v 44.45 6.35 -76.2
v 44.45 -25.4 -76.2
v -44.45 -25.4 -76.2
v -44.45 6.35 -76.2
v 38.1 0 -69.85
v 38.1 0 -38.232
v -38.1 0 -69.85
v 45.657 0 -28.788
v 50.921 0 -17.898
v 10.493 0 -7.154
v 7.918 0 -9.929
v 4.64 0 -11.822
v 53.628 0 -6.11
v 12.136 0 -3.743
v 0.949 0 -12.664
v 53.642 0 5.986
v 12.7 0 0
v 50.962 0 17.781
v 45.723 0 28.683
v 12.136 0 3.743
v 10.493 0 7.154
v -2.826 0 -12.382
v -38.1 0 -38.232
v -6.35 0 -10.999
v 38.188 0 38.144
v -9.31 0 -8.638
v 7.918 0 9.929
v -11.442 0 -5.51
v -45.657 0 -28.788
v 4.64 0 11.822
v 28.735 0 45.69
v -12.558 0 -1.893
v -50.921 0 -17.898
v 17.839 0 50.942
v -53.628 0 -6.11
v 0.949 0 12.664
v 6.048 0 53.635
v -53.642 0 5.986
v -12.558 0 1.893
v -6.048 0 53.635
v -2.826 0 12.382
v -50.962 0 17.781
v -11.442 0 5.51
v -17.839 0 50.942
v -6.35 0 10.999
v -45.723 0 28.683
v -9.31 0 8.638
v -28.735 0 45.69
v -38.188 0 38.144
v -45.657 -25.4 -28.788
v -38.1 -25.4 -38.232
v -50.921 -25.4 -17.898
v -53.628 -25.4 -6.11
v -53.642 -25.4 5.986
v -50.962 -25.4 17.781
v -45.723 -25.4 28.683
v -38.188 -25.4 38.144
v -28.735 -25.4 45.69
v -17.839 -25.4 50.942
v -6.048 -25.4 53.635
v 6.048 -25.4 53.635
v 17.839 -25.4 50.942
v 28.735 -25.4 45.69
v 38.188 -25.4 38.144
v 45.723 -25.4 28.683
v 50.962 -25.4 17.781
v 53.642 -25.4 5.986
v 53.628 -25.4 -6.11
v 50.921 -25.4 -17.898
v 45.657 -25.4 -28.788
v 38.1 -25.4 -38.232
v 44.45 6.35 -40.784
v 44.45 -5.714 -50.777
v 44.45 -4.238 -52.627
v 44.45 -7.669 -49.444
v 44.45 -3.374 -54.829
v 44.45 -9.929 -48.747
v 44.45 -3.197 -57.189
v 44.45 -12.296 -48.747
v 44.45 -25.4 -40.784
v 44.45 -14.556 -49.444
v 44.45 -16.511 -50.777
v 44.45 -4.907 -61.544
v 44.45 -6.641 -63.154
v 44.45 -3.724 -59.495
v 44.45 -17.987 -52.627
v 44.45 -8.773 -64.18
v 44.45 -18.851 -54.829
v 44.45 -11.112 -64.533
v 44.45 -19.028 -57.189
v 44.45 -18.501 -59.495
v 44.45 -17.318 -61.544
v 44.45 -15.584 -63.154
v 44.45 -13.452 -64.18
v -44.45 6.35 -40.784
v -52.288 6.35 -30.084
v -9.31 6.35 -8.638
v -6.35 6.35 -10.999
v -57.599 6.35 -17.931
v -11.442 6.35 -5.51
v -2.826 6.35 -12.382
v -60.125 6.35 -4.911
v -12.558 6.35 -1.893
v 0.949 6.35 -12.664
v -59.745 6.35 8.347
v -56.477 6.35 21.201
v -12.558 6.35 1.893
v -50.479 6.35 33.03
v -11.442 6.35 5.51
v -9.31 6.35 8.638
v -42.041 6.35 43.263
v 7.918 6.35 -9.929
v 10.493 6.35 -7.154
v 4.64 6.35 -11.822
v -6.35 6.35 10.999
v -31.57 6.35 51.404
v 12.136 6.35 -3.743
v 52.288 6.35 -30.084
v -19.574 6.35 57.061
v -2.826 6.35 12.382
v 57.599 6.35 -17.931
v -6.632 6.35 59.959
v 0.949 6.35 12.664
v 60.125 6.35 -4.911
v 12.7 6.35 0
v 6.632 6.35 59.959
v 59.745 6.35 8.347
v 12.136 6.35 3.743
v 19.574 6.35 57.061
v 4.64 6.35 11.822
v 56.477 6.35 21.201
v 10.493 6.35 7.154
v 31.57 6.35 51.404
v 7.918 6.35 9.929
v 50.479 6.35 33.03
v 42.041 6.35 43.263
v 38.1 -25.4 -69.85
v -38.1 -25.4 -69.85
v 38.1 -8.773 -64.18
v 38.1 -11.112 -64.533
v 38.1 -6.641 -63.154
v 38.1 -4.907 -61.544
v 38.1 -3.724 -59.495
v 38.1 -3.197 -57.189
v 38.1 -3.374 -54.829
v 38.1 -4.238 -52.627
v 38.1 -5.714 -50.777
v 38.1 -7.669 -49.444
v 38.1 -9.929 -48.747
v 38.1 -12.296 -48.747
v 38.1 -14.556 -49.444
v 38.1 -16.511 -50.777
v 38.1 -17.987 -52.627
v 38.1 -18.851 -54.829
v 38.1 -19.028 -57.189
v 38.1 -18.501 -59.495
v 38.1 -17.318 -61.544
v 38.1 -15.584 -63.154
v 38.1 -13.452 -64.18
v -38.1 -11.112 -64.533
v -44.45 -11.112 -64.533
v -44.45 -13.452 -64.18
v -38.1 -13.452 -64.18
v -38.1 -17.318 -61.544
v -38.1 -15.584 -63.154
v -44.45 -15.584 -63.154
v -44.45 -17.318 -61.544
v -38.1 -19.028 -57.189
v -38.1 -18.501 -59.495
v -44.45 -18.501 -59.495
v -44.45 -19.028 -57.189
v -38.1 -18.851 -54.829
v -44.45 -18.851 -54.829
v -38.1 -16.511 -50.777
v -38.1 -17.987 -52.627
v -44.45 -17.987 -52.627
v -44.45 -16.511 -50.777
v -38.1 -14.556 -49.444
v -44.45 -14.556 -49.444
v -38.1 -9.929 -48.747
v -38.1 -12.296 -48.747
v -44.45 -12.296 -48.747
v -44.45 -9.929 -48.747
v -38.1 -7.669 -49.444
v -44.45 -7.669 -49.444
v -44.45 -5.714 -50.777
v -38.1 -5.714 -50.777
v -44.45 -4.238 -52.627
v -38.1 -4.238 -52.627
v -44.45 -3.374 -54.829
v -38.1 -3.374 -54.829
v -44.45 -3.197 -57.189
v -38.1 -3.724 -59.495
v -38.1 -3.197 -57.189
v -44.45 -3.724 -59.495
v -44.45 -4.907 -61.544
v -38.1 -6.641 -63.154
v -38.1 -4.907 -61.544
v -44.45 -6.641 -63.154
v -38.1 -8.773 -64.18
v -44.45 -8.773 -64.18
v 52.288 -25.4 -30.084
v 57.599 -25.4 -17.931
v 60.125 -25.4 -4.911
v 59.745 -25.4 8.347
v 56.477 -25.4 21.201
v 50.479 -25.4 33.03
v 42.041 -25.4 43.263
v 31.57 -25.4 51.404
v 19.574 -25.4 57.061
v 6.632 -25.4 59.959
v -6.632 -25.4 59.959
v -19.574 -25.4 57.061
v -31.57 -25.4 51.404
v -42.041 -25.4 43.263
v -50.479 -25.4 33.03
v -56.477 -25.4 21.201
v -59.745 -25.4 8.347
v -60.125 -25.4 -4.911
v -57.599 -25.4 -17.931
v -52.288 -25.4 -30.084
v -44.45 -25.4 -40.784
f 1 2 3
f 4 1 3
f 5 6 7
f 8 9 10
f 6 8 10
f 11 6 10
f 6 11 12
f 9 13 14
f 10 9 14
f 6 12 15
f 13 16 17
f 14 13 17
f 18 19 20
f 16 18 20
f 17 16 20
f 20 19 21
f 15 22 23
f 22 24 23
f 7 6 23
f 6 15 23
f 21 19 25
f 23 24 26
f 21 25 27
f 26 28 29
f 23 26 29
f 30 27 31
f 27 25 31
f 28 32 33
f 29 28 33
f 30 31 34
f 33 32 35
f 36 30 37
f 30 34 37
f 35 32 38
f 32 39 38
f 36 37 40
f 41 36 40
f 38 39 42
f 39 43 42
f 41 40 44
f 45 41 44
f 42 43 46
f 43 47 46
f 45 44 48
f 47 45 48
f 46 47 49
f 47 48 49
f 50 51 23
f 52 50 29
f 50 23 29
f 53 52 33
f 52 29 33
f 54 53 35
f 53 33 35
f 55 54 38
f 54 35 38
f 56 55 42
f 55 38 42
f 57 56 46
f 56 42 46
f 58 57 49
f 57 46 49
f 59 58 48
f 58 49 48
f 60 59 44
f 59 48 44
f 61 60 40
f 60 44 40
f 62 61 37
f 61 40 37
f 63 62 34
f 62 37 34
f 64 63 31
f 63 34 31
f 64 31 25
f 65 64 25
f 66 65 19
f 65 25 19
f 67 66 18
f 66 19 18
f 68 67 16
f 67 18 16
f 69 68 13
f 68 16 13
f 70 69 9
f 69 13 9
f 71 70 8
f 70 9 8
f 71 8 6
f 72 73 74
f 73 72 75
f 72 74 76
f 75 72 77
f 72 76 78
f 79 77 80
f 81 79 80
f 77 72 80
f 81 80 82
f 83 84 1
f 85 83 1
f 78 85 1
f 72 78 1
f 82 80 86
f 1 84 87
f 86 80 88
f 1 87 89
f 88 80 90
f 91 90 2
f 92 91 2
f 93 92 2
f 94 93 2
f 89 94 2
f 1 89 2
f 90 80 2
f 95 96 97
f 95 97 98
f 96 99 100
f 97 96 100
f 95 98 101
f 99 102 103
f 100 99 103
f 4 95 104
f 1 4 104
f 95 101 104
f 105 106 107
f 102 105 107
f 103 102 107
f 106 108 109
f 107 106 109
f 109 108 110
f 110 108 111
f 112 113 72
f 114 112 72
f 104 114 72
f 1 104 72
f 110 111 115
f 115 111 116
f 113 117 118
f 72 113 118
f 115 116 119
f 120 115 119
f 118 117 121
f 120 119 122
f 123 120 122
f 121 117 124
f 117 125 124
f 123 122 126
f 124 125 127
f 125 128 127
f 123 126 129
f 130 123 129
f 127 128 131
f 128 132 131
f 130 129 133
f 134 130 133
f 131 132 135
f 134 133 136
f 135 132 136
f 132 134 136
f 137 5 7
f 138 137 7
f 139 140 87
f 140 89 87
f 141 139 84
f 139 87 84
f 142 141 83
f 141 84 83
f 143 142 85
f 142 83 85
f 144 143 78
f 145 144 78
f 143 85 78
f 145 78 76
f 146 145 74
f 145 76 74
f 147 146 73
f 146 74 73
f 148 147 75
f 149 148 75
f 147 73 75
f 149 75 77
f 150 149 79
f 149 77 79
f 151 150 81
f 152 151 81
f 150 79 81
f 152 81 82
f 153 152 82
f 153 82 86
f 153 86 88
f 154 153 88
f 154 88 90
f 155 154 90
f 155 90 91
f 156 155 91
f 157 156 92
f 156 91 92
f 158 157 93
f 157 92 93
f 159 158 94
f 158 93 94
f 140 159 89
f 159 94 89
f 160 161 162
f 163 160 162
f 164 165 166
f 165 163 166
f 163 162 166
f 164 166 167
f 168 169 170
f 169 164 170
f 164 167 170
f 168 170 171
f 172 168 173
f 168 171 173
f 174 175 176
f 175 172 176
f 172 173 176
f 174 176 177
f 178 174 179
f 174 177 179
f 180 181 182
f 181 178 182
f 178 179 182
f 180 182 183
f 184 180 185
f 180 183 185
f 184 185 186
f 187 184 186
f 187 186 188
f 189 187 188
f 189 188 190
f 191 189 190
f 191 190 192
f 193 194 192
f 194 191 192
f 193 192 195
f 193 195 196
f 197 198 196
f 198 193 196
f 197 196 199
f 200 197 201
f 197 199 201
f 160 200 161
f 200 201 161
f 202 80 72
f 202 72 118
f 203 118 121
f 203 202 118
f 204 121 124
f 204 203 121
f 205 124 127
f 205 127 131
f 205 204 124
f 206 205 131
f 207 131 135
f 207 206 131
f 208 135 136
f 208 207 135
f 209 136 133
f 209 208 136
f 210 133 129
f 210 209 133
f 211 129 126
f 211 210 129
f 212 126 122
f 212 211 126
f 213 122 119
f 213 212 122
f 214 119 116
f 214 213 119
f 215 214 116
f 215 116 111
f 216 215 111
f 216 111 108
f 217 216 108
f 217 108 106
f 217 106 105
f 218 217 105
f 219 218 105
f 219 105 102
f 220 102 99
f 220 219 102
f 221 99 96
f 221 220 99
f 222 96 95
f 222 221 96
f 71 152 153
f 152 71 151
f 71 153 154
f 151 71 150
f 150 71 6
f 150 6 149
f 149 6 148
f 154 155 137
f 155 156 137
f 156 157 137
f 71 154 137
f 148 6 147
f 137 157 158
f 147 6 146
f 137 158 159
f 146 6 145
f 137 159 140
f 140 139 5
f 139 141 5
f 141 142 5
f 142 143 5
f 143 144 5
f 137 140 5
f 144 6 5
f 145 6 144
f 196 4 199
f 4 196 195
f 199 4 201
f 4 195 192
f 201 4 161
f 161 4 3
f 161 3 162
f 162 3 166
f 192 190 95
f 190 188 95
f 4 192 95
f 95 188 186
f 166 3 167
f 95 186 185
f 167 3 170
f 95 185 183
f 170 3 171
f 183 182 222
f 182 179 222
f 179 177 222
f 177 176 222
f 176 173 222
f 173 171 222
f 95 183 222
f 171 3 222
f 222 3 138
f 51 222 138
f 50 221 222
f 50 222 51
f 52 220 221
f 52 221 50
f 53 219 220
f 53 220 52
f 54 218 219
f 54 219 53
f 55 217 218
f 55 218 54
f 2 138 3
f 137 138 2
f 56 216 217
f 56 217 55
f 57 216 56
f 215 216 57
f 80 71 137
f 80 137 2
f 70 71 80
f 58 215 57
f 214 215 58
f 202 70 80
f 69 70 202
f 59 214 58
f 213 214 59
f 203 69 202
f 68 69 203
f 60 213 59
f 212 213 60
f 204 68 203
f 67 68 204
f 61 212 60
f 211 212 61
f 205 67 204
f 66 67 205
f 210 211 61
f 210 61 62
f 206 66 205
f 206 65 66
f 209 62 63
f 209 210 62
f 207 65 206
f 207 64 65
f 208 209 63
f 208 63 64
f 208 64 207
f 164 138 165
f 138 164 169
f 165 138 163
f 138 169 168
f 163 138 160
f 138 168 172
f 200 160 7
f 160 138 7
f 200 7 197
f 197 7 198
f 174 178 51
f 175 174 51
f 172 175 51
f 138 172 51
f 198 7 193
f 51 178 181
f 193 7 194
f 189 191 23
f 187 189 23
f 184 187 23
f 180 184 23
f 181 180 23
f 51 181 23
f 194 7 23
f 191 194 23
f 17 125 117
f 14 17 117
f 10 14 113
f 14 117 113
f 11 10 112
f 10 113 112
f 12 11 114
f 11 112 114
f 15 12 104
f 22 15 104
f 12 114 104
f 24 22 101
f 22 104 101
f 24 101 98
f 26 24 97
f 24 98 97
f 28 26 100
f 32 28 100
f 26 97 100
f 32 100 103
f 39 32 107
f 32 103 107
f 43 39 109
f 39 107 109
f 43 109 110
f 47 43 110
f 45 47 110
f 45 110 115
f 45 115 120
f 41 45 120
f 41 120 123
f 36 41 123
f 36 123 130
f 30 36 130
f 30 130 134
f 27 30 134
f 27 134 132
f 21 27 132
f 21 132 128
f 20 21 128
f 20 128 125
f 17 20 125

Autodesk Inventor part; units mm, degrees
ref_plane "YZ Plane" through (0, 0, 0) normal (1, 0, 0) x (0, 1, 0)
ref_plane "XZ Plane" through (0, 0, 0) normal (0, 1, 0) x (-1, 0, 0)
ref_plane "XY Plane" through (0, 0, 0) normal (0, 0, 1) x (1, 0, 0)
sketch "Sketch1" plane through (0, 0, 0) normal (0, 1, 0) x (-1, 0, 0)
  arc A0 (38.1, -38.2321) -> (-38.1, -38.2321) centre (0, 0) ccw
  line L0 (0, 0) -> (0, -72.7817) construction
  line L1 (-38.1, -38.2321) -> (-38.1, -69.85)
  line L2 (-38.1, -69.85) -> (0, -69.85)
  line L3 (0, -69.85) -> (38.1, -69.85)
  line L4 (38.1, -69.85) -> (38.1, -38.2321)
  dimension "d0" = 107.95
  dimension "d6" = 69.85
  dimension "d7" = 38.1
extrude "Extrusion1" add sketch "Sketch1" along normal blind 6.35
sketch "Sketch3" plane through (0, 0, 0) normal (0, -1, 0) x (1, 0, 0)
  arc A0 (38.1, -38.2321) -> (-38.1, -38.2321) centre (0, 0) ccw projected
  line L0 (38.1, -38.2321) -> (38.1, -69.85) projected
  line L1 (38.1, -69.85) -> (-38.1, -69.85) projected
  line L2 (-38.1, -69.85) -> (-38.1, -38.2321) projected
  arc A1 (38.1, -38.2321) -> (-38.1, -38.2321) centre (0, 0) ccw
  line L3 (38.1, -38.2321) -> (38.1, -69.85) projected
  line L4 (38.1, -38.2321) -> (38.1, -69.85)
  line L5 (38.1, -69.85) -> (-38.1, -69.85)
  line L6 (-38.1, -69.85) -> (-38.1, -38.2321) projected
  line L7 (-38.1, -69.85) -> (-38.1, -38.2321)
  arc A2 (44.45, -40.7836) -> (-44.45, -40.7836) centre (0, 0) ccw
  line L8 (44.45, -40.7836) -> (44.45, -76.2)
  line L9 (44.45, -76.2) -> (-44.45, -76.2)
  line L10 (-44.45, -76.2) -> (-44.45, -40.7836)
  dimension "d8" = 6.35
  dimension "d9" = 6.35
  dimension "d10" = 6.35
  dimension "d11" = 6.35
extrude "Extrusion3" add sketch "Sketch3" along normal blind 25.4
extrude "Extrusion4" add sketch "Sketch3" against normal blind 6.35
sketch "Sketch4" plane through (44.45, -25.4, -40.7836) normal (1, 0, 0) x (0, 0, -1)
  line L0 (20.7014, 17.1105) -> (20.7014, 11.6112) projected
  line L1 (10.9224, 11.4645) -> (10.9224, 17.1105) projected
  line L2 (15.6849, 8.7149) -> (10.9224, 11.4645) projected
  line L3 (20.7014, 11.6112) -> (15.6849, 8.7149) projected
  line L4 (15.8119, 19.9334) -> (20.7014, 17.1105) projected
  line L5 (10.9224, 17.1105) -> (15.8119, 19.9334) projected
  line L6 (10.9224, 17.1105) -> (20.7014, 11.6112) construction
  line L7 (10.9224, 11.4645) -> (20.7014, 17.1105) construction
  circle A0 centre (15.8119, 14.2875) radius 7.9375
  line L8 (20.5744, 17.0371) -> (20.5744, 11.5379)
  line L9 (20.5744, 11.5379) -> (15.8119, 8.7882)
  line L10 (15.8119, 8.7882) -> (11.0494, 11.5379)
  line L11 (11.0494, 11.5379) -> (11.0494, 17.0371)
  line L12 (11.0494, 17.0371) -> (15.8119, 19.7868)
  line L13 (15.8119, 19.7868) -> (20.5744, 17.0371)
  point P0 (-40.7836, 25.4)
  dimension "d20" = 15.875
  dimension "d21" = 9.525
extrude "Extrusion6" cut sketch "Sketch4" against normal up to surface (6.35 mm away) contours L0 L3 L8 L13 L12 L11 L10 L2 L1 L5 L4 | L3 L10 L11 L12 L13 L8 | A0
mirror "Mirror1" about plane through (0, 0, 0) normal (1, 0, 0) of "Extrusion6"
sketch "Sketch5" plane through (0, 6.35, 0) normal (0, 1, 0) x (1, 0, 0)
  circle A0 centre (0, 0) radius 12.7
  dimension "d24" = 25.4
extrude "Extrusion7" cut sketch "Sketch5" against normal through all
equation "\"d0\" = exteriorDiameter"
equation "\"exteriorDiameter\" = 107.95"
properties part number "baseSupport"
